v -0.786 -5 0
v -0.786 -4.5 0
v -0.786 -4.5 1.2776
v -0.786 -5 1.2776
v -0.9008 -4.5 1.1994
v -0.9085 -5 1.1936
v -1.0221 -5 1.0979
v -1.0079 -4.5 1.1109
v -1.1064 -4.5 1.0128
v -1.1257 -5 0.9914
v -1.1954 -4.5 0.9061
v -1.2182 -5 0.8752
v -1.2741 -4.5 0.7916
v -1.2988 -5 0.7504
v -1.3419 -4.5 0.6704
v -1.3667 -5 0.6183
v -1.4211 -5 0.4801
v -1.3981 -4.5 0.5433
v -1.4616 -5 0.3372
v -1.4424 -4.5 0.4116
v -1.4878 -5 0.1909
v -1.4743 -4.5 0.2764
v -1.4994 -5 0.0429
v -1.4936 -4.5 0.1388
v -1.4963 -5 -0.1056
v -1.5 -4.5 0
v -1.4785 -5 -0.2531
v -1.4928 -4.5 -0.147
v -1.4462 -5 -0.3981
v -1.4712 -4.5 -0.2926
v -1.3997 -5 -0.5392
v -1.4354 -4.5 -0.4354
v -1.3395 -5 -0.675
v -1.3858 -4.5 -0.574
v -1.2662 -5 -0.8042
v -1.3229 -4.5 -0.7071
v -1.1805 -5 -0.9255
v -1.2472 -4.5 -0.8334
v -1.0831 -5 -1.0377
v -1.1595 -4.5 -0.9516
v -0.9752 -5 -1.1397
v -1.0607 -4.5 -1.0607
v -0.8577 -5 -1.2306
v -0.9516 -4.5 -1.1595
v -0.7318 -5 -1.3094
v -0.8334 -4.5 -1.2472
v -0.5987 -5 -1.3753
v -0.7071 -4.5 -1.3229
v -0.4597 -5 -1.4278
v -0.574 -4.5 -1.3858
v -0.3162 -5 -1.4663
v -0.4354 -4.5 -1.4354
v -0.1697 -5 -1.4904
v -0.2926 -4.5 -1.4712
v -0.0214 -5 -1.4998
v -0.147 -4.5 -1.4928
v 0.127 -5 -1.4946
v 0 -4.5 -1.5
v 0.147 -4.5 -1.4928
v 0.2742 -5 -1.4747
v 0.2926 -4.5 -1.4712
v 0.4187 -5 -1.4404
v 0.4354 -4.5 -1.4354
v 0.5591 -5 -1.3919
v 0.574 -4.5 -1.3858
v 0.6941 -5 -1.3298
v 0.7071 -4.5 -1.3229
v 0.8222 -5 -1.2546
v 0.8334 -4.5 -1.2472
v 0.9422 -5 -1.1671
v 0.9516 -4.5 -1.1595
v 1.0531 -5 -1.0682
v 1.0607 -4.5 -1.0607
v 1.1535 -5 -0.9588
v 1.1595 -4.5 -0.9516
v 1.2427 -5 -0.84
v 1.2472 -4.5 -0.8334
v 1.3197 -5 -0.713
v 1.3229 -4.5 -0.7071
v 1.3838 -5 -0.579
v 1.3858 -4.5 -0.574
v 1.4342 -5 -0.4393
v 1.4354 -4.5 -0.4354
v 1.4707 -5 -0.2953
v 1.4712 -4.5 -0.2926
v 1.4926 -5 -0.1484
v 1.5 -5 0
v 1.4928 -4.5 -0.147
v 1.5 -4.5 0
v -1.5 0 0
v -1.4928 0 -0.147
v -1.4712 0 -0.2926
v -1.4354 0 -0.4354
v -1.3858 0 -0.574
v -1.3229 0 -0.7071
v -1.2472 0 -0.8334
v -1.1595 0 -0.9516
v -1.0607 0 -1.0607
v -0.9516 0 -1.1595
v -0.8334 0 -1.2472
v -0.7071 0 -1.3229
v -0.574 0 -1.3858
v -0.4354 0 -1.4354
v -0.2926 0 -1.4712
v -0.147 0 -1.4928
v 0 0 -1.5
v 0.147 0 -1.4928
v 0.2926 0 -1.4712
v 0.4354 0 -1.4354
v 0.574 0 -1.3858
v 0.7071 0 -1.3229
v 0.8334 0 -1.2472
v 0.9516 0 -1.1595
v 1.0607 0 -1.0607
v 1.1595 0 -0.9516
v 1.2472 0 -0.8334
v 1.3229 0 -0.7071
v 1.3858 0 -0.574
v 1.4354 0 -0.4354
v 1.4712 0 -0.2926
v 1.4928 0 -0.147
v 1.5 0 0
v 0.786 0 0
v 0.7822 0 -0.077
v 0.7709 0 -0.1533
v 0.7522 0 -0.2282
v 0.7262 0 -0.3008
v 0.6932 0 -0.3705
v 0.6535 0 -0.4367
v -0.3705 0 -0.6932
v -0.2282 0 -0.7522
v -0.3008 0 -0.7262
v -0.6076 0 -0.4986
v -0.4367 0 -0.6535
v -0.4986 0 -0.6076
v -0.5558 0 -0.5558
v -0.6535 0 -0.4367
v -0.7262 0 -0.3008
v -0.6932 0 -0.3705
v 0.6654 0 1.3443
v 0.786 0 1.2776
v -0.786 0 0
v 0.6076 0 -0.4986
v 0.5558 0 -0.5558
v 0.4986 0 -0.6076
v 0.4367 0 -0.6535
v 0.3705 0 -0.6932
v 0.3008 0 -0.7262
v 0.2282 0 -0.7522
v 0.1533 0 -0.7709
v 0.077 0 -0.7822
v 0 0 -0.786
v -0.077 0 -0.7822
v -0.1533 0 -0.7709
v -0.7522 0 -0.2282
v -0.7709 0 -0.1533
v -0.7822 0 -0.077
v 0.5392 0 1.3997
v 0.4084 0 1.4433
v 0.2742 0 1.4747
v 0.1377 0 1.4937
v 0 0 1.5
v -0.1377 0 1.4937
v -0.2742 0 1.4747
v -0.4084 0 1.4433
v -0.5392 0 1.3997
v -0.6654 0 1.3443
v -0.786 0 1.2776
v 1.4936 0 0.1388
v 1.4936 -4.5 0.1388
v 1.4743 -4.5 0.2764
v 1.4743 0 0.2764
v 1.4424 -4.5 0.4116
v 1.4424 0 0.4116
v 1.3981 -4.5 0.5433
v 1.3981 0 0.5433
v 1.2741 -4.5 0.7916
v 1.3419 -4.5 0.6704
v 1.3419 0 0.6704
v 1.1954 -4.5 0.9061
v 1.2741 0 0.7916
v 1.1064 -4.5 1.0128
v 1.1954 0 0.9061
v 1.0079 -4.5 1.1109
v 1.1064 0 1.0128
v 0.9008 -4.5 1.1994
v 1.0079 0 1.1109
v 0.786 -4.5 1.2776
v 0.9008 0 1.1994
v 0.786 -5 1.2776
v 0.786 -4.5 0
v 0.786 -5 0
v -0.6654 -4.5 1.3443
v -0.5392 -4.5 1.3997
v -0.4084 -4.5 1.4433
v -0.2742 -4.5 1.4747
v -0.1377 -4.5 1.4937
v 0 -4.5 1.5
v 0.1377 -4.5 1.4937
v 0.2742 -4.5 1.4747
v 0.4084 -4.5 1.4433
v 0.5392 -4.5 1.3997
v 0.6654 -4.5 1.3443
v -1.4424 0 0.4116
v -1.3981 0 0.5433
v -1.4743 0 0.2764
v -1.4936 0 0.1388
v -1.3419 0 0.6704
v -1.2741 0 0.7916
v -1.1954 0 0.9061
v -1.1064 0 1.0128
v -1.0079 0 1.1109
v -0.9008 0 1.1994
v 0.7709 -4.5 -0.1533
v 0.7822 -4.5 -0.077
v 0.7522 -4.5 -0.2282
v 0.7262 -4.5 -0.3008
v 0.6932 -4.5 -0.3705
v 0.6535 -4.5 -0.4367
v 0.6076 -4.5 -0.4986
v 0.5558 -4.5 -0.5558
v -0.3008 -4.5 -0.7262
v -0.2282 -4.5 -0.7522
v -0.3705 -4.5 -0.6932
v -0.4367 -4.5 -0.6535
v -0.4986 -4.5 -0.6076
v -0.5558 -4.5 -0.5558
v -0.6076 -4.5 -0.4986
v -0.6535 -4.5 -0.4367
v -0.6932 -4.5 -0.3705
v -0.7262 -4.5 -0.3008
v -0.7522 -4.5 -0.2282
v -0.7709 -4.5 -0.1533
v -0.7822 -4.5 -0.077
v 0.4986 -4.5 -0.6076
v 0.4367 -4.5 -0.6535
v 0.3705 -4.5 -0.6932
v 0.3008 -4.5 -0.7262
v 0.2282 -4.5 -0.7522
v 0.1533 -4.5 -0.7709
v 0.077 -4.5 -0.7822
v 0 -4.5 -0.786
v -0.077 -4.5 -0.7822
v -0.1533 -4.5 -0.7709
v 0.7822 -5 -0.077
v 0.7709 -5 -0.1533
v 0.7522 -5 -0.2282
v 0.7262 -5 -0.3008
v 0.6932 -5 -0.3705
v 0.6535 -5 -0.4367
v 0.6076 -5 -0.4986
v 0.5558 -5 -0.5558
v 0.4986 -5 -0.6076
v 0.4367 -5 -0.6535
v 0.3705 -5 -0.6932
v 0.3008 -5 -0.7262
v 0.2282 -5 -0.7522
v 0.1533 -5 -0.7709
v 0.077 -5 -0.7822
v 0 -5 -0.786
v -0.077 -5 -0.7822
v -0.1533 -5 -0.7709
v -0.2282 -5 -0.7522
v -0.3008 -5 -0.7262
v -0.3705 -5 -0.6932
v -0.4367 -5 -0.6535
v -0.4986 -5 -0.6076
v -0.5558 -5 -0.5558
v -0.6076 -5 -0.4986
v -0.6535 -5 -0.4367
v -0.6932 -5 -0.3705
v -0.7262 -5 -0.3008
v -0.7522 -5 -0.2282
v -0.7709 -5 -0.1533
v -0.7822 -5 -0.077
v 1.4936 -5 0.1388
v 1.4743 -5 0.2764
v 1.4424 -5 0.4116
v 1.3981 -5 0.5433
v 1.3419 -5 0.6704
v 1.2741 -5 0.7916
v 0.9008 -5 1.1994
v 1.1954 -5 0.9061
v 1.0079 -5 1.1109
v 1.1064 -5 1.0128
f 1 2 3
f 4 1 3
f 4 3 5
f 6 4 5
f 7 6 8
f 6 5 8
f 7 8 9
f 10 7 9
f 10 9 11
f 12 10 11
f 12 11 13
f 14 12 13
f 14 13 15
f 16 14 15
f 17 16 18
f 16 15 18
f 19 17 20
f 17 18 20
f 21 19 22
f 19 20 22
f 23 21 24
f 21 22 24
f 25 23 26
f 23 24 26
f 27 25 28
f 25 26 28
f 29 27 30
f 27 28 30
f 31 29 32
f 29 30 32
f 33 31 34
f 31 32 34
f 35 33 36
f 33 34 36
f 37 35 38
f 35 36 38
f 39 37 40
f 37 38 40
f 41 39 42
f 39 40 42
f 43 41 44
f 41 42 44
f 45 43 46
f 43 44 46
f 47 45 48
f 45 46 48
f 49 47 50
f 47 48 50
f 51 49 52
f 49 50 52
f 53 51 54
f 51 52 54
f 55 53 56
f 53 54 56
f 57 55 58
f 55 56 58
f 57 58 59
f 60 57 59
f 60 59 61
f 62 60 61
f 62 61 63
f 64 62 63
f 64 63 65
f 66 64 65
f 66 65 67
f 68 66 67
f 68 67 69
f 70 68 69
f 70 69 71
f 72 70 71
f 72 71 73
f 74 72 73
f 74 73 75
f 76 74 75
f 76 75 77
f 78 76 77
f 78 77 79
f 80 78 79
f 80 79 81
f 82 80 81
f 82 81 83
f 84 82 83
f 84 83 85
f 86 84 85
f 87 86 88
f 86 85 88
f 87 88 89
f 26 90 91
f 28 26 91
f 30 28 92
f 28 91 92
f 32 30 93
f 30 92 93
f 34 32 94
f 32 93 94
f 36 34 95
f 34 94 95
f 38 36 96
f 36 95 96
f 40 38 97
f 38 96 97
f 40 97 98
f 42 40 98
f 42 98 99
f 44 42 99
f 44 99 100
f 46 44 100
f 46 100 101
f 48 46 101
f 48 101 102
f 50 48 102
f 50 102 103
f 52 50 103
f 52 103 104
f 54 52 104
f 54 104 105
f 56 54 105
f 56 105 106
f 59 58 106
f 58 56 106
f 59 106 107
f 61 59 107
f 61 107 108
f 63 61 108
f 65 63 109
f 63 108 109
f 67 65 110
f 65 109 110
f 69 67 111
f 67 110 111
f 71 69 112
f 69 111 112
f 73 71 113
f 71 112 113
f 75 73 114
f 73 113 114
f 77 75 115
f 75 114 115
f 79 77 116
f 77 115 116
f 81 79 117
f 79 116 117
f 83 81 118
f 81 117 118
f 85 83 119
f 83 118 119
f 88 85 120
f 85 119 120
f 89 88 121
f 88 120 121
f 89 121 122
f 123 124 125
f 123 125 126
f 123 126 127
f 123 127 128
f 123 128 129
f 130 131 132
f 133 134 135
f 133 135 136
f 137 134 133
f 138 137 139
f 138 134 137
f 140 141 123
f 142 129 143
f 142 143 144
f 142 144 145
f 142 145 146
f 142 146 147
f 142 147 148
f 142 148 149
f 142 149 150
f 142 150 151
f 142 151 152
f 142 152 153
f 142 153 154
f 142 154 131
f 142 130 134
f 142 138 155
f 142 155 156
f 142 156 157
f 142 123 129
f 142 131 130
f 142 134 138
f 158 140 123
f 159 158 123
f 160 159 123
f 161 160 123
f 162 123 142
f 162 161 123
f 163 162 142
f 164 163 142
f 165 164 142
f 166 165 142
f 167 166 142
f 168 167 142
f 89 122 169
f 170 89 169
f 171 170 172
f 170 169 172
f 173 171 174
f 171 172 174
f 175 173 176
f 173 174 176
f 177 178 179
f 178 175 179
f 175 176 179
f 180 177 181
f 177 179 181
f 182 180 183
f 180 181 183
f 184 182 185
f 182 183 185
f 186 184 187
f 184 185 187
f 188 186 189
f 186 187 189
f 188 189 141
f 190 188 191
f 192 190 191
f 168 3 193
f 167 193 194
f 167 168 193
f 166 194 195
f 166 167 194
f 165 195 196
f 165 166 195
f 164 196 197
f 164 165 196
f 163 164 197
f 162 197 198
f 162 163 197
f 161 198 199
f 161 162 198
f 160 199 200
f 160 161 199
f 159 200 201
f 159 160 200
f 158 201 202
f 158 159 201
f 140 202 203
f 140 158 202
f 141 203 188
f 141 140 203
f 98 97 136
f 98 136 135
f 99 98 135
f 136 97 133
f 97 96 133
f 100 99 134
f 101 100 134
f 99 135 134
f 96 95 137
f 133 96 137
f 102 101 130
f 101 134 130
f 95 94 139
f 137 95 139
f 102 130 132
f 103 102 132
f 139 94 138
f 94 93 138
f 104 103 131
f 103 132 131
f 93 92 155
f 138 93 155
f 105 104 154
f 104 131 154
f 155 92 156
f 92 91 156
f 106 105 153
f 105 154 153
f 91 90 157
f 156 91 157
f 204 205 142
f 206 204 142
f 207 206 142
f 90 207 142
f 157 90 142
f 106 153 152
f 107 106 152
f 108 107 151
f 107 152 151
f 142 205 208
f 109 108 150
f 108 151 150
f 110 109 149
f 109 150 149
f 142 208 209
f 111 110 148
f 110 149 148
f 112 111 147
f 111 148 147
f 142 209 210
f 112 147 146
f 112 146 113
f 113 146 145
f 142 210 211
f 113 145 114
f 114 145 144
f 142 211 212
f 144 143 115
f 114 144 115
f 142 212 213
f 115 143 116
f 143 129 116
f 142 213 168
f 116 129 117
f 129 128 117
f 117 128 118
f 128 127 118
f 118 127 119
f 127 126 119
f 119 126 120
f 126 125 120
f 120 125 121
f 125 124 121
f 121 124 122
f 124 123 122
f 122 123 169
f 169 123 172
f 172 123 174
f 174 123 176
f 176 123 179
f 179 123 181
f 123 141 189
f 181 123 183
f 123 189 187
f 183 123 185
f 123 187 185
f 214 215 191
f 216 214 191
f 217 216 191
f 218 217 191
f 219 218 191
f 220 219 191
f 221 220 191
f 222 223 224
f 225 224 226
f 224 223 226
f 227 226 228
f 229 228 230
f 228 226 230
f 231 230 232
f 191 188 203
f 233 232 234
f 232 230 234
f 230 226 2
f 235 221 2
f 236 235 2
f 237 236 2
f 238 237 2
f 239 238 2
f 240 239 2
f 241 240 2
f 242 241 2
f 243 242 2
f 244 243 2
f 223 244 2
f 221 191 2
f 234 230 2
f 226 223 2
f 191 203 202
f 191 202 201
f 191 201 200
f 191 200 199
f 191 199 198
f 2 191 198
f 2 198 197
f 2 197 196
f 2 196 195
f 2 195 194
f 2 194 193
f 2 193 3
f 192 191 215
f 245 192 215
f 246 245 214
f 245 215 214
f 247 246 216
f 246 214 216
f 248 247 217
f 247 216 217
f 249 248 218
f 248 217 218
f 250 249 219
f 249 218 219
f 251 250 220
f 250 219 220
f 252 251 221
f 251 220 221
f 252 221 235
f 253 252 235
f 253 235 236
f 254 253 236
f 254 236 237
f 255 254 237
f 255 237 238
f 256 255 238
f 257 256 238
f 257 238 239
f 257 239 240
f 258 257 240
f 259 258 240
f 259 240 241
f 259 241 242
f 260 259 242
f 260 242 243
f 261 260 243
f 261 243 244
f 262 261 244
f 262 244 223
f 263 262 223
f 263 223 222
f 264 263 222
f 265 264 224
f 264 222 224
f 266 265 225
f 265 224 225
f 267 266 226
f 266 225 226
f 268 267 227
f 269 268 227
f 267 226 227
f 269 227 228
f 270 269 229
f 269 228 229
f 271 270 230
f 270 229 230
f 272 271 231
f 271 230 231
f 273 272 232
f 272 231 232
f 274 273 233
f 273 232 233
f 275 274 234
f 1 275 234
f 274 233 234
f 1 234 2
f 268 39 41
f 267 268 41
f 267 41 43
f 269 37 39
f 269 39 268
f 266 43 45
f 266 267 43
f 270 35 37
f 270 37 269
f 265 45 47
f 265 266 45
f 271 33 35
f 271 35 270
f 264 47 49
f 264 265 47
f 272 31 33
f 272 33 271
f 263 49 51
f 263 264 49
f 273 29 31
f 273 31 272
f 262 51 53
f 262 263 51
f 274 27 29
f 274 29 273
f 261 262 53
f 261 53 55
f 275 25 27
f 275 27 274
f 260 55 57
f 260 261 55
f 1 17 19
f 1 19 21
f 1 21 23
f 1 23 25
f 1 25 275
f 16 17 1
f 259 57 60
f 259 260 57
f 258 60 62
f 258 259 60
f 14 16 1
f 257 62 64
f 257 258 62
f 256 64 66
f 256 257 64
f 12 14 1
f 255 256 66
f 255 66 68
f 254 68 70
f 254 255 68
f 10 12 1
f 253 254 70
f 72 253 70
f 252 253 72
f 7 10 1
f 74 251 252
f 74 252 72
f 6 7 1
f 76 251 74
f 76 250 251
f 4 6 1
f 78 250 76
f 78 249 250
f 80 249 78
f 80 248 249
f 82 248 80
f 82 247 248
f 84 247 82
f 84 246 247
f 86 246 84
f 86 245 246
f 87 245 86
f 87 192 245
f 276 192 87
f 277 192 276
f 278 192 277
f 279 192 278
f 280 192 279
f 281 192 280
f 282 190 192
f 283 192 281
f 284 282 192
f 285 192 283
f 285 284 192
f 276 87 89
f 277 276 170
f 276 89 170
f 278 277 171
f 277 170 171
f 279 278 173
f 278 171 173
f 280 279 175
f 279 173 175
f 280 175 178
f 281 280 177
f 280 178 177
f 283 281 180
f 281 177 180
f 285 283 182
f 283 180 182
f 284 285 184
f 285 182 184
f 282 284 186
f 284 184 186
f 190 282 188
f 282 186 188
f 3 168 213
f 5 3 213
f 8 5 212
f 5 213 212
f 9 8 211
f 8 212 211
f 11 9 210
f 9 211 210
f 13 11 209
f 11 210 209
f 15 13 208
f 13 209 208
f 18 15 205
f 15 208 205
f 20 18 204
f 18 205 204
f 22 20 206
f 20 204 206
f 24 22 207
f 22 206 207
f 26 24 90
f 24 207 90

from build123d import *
from build123d import SkipClean  # not in build123d's __all__

# Parameters (mm, degrees)
F1_DEPTH = 5
F2_R     = 1.5
F3_DEPTH = 4.5


with BuildPart() as f1:
    # F0 (on Front) → F1 (new body)
    with BuildSketch(Plane.XZ):
        with BuildLine():
            ThreePointArc((-0.786, 1.2775773949), (-0.7317786551, -1.3093891706), (1.5, 0))
            ThreePointArc((1.5, 0), (1.3093891706, 0.7317786551), (0.786, 1.2775773949))
            Line((0.786, 1.2775773949), (0.786, 0))
            ThreePointArc((0.786, 0), (0, -0.786), (-0.786, 0))
            Line((-0.786, 0), (-0.786, 1.2775773949))
        make_face()
    extrude(amount=F1_DEPTH)

    # F2 (on face) → F3 (join)
    with BuildSketch(Plane(origin=(0, 0, 0), x_dir=(-1, 0, 0), z_dir=(0, 1, 0))):
        Circle(F2_R)
    with SkipClean():  # cleaning this boolean's faces spoils the solid; the shape is the same uncleaned
        extrude(amount=-F3_DEPTH)


solid = f1.part
